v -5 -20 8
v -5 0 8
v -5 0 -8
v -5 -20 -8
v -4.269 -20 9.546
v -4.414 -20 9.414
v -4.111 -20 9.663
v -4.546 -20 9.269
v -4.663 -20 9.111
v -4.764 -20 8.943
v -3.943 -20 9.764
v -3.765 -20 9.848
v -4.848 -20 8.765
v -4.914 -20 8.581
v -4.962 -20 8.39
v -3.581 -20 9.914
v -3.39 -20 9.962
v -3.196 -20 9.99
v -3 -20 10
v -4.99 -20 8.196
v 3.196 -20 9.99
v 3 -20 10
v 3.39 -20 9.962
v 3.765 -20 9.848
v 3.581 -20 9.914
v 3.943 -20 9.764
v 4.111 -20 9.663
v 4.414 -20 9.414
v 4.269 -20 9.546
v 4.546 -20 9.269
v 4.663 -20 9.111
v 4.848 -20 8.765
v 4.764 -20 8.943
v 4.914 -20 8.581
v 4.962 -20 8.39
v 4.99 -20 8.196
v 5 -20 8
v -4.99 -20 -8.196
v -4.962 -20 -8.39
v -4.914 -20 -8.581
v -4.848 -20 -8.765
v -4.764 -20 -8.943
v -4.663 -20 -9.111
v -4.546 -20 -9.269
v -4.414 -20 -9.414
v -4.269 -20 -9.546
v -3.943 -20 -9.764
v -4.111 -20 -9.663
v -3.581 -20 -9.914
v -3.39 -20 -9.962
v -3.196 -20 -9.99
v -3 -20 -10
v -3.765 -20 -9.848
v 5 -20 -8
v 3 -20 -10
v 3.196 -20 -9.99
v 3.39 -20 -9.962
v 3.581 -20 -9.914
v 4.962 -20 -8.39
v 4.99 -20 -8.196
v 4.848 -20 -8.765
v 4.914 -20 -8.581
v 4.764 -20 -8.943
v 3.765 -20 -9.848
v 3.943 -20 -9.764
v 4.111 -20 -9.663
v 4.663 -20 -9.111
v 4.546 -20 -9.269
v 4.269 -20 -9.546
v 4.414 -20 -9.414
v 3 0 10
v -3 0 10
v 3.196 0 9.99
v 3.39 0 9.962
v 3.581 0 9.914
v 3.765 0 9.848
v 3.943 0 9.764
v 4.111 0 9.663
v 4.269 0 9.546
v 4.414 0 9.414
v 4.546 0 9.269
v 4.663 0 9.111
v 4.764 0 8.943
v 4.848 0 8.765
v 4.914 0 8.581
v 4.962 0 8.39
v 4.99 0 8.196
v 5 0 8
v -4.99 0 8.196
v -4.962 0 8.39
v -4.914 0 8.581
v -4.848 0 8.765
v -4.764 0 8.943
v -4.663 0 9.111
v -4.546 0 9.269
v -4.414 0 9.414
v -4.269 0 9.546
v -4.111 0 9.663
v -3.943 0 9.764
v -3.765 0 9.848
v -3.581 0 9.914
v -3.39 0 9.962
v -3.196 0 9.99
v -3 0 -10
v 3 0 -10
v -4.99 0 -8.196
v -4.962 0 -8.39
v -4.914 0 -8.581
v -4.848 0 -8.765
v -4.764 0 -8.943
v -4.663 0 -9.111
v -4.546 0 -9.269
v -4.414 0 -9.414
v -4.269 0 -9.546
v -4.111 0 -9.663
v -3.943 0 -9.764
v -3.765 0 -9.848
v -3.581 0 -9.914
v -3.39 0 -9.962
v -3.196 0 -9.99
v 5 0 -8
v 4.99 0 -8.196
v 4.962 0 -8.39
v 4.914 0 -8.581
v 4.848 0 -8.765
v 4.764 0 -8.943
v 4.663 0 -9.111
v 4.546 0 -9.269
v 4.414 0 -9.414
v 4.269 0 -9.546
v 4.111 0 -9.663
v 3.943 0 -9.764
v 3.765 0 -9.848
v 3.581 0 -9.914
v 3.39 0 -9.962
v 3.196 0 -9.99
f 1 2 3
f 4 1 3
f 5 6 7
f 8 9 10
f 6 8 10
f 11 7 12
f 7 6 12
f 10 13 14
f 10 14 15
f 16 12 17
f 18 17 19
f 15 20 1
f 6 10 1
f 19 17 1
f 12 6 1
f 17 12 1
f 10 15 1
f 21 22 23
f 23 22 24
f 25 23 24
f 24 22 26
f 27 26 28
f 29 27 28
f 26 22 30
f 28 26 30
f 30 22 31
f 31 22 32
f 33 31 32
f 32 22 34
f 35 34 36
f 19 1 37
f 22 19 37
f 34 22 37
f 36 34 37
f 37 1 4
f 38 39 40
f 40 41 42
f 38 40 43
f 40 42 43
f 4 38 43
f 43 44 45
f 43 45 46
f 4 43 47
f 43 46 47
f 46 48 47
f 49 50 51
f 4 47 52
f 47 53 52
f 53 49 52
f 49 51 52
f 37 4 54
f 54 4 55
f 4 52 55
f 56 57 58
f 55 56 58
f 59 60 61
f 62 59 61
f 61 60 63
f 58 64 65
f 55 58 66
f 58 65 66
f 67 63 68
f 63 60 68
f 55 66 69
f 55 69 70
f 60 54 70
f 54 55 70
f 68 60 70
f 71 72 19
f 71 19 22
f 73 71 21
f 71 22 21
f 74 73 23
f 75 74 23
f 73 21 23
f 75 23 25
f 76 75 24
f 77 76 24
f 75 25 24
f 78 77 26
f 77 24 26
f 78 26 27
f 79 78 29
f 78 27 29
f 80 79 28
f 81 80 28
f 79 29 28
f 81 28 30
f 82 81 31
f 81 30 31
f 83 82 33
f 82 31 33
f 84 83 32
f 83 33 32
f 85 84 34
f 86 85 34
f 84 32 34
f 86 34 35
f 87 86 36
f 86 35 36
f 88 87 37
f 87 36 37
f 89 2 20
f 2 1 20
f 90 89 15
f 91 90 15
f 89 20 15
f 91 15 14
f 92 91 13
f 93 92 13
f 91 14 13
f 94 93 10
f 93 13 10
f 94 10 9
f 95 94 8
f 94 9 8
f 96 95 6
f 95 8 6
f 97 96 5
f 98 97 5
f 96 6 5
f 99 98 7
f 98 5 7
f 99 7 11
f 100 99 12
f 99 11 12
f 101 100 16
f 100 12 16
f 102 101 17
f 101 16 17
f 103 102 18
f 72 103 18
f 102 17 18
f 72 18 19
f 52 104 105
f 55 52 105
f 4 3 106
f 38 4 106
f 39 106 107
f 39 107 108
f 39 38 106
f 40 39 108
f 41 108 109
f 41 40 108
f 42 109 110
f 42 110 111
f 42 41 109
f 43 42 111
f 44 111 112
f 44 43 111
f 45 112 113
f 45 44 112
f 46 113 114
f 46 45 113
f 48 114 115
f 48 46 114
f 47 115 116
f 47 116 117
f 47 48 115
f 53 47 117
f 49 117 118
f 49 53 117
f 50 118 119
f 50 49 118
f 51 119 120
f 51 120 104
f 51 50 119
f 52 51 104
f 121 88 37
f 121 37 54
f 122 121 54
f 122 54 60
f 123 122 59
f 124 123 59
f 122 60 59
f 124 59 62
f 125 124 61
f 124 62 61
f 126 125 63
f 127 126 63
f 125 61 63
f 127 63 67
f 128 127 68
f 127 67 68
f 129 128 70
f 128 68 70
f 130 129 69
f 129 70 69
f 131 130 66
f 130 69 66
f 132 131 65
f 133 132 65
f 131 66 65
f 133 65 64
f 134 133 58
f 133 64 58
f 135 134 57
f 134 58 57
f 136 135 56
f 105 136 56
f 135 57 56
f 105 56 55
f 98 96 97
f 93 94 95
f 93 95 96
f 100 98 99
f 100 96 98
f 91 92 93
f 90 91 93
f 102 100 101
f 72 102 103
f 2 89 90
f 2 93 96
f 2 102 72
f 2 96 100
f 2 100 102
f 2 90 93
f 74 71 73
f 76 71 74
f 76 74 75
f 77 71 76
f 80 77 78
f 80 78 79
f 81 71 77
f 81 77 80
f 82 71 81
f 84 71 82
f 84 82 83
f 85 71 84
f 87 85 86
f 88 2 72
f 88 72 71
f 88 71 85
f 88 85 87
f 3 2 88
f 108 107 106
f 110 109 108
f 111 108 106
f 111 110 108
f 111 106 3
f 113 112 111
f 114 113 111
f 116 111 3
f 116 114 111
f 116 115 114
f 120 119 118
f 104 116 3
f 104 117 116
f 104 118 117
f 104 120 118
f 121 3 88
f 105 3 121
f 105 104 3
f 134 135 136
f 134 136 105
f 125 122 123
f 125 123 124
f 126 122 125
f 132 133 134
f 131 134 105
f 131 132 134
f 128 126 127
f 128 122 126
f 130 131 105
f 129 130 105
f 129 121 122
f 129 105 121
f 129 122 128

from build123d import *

# Parameters (mm, degrees)
SRECTANGLE_W     = 10
SRECTANGLE_H     = 20
FRECTANGLE_DEPTH = 20
FRRECTANGLE_R    = 2


with BuildPart() as part:
    # SRectangle → FRectangle (new body)
    with BuildSketch(Plane(origin=(0, 0, 0), x_dir=(1, 0, 0), z_dir=(0, 1, 0))):
        Rectangle(SRECTANGLE_W, SRECTANGLE_H)
    extrude(amount=-FRECTANGLE_DEPTH)

    # FRRectangle
    frrectangle_edges = [part.edges().sort_by_distance(p)[0] for p in [
        (5, -10, 10),
        (-5, -10, 10),
        (-5, -10, -10),
        (5, -10, -10),
    ]]
    fillet(frrectangle_edges, radius=FRRECTANGLE_R)


solid = part.part
